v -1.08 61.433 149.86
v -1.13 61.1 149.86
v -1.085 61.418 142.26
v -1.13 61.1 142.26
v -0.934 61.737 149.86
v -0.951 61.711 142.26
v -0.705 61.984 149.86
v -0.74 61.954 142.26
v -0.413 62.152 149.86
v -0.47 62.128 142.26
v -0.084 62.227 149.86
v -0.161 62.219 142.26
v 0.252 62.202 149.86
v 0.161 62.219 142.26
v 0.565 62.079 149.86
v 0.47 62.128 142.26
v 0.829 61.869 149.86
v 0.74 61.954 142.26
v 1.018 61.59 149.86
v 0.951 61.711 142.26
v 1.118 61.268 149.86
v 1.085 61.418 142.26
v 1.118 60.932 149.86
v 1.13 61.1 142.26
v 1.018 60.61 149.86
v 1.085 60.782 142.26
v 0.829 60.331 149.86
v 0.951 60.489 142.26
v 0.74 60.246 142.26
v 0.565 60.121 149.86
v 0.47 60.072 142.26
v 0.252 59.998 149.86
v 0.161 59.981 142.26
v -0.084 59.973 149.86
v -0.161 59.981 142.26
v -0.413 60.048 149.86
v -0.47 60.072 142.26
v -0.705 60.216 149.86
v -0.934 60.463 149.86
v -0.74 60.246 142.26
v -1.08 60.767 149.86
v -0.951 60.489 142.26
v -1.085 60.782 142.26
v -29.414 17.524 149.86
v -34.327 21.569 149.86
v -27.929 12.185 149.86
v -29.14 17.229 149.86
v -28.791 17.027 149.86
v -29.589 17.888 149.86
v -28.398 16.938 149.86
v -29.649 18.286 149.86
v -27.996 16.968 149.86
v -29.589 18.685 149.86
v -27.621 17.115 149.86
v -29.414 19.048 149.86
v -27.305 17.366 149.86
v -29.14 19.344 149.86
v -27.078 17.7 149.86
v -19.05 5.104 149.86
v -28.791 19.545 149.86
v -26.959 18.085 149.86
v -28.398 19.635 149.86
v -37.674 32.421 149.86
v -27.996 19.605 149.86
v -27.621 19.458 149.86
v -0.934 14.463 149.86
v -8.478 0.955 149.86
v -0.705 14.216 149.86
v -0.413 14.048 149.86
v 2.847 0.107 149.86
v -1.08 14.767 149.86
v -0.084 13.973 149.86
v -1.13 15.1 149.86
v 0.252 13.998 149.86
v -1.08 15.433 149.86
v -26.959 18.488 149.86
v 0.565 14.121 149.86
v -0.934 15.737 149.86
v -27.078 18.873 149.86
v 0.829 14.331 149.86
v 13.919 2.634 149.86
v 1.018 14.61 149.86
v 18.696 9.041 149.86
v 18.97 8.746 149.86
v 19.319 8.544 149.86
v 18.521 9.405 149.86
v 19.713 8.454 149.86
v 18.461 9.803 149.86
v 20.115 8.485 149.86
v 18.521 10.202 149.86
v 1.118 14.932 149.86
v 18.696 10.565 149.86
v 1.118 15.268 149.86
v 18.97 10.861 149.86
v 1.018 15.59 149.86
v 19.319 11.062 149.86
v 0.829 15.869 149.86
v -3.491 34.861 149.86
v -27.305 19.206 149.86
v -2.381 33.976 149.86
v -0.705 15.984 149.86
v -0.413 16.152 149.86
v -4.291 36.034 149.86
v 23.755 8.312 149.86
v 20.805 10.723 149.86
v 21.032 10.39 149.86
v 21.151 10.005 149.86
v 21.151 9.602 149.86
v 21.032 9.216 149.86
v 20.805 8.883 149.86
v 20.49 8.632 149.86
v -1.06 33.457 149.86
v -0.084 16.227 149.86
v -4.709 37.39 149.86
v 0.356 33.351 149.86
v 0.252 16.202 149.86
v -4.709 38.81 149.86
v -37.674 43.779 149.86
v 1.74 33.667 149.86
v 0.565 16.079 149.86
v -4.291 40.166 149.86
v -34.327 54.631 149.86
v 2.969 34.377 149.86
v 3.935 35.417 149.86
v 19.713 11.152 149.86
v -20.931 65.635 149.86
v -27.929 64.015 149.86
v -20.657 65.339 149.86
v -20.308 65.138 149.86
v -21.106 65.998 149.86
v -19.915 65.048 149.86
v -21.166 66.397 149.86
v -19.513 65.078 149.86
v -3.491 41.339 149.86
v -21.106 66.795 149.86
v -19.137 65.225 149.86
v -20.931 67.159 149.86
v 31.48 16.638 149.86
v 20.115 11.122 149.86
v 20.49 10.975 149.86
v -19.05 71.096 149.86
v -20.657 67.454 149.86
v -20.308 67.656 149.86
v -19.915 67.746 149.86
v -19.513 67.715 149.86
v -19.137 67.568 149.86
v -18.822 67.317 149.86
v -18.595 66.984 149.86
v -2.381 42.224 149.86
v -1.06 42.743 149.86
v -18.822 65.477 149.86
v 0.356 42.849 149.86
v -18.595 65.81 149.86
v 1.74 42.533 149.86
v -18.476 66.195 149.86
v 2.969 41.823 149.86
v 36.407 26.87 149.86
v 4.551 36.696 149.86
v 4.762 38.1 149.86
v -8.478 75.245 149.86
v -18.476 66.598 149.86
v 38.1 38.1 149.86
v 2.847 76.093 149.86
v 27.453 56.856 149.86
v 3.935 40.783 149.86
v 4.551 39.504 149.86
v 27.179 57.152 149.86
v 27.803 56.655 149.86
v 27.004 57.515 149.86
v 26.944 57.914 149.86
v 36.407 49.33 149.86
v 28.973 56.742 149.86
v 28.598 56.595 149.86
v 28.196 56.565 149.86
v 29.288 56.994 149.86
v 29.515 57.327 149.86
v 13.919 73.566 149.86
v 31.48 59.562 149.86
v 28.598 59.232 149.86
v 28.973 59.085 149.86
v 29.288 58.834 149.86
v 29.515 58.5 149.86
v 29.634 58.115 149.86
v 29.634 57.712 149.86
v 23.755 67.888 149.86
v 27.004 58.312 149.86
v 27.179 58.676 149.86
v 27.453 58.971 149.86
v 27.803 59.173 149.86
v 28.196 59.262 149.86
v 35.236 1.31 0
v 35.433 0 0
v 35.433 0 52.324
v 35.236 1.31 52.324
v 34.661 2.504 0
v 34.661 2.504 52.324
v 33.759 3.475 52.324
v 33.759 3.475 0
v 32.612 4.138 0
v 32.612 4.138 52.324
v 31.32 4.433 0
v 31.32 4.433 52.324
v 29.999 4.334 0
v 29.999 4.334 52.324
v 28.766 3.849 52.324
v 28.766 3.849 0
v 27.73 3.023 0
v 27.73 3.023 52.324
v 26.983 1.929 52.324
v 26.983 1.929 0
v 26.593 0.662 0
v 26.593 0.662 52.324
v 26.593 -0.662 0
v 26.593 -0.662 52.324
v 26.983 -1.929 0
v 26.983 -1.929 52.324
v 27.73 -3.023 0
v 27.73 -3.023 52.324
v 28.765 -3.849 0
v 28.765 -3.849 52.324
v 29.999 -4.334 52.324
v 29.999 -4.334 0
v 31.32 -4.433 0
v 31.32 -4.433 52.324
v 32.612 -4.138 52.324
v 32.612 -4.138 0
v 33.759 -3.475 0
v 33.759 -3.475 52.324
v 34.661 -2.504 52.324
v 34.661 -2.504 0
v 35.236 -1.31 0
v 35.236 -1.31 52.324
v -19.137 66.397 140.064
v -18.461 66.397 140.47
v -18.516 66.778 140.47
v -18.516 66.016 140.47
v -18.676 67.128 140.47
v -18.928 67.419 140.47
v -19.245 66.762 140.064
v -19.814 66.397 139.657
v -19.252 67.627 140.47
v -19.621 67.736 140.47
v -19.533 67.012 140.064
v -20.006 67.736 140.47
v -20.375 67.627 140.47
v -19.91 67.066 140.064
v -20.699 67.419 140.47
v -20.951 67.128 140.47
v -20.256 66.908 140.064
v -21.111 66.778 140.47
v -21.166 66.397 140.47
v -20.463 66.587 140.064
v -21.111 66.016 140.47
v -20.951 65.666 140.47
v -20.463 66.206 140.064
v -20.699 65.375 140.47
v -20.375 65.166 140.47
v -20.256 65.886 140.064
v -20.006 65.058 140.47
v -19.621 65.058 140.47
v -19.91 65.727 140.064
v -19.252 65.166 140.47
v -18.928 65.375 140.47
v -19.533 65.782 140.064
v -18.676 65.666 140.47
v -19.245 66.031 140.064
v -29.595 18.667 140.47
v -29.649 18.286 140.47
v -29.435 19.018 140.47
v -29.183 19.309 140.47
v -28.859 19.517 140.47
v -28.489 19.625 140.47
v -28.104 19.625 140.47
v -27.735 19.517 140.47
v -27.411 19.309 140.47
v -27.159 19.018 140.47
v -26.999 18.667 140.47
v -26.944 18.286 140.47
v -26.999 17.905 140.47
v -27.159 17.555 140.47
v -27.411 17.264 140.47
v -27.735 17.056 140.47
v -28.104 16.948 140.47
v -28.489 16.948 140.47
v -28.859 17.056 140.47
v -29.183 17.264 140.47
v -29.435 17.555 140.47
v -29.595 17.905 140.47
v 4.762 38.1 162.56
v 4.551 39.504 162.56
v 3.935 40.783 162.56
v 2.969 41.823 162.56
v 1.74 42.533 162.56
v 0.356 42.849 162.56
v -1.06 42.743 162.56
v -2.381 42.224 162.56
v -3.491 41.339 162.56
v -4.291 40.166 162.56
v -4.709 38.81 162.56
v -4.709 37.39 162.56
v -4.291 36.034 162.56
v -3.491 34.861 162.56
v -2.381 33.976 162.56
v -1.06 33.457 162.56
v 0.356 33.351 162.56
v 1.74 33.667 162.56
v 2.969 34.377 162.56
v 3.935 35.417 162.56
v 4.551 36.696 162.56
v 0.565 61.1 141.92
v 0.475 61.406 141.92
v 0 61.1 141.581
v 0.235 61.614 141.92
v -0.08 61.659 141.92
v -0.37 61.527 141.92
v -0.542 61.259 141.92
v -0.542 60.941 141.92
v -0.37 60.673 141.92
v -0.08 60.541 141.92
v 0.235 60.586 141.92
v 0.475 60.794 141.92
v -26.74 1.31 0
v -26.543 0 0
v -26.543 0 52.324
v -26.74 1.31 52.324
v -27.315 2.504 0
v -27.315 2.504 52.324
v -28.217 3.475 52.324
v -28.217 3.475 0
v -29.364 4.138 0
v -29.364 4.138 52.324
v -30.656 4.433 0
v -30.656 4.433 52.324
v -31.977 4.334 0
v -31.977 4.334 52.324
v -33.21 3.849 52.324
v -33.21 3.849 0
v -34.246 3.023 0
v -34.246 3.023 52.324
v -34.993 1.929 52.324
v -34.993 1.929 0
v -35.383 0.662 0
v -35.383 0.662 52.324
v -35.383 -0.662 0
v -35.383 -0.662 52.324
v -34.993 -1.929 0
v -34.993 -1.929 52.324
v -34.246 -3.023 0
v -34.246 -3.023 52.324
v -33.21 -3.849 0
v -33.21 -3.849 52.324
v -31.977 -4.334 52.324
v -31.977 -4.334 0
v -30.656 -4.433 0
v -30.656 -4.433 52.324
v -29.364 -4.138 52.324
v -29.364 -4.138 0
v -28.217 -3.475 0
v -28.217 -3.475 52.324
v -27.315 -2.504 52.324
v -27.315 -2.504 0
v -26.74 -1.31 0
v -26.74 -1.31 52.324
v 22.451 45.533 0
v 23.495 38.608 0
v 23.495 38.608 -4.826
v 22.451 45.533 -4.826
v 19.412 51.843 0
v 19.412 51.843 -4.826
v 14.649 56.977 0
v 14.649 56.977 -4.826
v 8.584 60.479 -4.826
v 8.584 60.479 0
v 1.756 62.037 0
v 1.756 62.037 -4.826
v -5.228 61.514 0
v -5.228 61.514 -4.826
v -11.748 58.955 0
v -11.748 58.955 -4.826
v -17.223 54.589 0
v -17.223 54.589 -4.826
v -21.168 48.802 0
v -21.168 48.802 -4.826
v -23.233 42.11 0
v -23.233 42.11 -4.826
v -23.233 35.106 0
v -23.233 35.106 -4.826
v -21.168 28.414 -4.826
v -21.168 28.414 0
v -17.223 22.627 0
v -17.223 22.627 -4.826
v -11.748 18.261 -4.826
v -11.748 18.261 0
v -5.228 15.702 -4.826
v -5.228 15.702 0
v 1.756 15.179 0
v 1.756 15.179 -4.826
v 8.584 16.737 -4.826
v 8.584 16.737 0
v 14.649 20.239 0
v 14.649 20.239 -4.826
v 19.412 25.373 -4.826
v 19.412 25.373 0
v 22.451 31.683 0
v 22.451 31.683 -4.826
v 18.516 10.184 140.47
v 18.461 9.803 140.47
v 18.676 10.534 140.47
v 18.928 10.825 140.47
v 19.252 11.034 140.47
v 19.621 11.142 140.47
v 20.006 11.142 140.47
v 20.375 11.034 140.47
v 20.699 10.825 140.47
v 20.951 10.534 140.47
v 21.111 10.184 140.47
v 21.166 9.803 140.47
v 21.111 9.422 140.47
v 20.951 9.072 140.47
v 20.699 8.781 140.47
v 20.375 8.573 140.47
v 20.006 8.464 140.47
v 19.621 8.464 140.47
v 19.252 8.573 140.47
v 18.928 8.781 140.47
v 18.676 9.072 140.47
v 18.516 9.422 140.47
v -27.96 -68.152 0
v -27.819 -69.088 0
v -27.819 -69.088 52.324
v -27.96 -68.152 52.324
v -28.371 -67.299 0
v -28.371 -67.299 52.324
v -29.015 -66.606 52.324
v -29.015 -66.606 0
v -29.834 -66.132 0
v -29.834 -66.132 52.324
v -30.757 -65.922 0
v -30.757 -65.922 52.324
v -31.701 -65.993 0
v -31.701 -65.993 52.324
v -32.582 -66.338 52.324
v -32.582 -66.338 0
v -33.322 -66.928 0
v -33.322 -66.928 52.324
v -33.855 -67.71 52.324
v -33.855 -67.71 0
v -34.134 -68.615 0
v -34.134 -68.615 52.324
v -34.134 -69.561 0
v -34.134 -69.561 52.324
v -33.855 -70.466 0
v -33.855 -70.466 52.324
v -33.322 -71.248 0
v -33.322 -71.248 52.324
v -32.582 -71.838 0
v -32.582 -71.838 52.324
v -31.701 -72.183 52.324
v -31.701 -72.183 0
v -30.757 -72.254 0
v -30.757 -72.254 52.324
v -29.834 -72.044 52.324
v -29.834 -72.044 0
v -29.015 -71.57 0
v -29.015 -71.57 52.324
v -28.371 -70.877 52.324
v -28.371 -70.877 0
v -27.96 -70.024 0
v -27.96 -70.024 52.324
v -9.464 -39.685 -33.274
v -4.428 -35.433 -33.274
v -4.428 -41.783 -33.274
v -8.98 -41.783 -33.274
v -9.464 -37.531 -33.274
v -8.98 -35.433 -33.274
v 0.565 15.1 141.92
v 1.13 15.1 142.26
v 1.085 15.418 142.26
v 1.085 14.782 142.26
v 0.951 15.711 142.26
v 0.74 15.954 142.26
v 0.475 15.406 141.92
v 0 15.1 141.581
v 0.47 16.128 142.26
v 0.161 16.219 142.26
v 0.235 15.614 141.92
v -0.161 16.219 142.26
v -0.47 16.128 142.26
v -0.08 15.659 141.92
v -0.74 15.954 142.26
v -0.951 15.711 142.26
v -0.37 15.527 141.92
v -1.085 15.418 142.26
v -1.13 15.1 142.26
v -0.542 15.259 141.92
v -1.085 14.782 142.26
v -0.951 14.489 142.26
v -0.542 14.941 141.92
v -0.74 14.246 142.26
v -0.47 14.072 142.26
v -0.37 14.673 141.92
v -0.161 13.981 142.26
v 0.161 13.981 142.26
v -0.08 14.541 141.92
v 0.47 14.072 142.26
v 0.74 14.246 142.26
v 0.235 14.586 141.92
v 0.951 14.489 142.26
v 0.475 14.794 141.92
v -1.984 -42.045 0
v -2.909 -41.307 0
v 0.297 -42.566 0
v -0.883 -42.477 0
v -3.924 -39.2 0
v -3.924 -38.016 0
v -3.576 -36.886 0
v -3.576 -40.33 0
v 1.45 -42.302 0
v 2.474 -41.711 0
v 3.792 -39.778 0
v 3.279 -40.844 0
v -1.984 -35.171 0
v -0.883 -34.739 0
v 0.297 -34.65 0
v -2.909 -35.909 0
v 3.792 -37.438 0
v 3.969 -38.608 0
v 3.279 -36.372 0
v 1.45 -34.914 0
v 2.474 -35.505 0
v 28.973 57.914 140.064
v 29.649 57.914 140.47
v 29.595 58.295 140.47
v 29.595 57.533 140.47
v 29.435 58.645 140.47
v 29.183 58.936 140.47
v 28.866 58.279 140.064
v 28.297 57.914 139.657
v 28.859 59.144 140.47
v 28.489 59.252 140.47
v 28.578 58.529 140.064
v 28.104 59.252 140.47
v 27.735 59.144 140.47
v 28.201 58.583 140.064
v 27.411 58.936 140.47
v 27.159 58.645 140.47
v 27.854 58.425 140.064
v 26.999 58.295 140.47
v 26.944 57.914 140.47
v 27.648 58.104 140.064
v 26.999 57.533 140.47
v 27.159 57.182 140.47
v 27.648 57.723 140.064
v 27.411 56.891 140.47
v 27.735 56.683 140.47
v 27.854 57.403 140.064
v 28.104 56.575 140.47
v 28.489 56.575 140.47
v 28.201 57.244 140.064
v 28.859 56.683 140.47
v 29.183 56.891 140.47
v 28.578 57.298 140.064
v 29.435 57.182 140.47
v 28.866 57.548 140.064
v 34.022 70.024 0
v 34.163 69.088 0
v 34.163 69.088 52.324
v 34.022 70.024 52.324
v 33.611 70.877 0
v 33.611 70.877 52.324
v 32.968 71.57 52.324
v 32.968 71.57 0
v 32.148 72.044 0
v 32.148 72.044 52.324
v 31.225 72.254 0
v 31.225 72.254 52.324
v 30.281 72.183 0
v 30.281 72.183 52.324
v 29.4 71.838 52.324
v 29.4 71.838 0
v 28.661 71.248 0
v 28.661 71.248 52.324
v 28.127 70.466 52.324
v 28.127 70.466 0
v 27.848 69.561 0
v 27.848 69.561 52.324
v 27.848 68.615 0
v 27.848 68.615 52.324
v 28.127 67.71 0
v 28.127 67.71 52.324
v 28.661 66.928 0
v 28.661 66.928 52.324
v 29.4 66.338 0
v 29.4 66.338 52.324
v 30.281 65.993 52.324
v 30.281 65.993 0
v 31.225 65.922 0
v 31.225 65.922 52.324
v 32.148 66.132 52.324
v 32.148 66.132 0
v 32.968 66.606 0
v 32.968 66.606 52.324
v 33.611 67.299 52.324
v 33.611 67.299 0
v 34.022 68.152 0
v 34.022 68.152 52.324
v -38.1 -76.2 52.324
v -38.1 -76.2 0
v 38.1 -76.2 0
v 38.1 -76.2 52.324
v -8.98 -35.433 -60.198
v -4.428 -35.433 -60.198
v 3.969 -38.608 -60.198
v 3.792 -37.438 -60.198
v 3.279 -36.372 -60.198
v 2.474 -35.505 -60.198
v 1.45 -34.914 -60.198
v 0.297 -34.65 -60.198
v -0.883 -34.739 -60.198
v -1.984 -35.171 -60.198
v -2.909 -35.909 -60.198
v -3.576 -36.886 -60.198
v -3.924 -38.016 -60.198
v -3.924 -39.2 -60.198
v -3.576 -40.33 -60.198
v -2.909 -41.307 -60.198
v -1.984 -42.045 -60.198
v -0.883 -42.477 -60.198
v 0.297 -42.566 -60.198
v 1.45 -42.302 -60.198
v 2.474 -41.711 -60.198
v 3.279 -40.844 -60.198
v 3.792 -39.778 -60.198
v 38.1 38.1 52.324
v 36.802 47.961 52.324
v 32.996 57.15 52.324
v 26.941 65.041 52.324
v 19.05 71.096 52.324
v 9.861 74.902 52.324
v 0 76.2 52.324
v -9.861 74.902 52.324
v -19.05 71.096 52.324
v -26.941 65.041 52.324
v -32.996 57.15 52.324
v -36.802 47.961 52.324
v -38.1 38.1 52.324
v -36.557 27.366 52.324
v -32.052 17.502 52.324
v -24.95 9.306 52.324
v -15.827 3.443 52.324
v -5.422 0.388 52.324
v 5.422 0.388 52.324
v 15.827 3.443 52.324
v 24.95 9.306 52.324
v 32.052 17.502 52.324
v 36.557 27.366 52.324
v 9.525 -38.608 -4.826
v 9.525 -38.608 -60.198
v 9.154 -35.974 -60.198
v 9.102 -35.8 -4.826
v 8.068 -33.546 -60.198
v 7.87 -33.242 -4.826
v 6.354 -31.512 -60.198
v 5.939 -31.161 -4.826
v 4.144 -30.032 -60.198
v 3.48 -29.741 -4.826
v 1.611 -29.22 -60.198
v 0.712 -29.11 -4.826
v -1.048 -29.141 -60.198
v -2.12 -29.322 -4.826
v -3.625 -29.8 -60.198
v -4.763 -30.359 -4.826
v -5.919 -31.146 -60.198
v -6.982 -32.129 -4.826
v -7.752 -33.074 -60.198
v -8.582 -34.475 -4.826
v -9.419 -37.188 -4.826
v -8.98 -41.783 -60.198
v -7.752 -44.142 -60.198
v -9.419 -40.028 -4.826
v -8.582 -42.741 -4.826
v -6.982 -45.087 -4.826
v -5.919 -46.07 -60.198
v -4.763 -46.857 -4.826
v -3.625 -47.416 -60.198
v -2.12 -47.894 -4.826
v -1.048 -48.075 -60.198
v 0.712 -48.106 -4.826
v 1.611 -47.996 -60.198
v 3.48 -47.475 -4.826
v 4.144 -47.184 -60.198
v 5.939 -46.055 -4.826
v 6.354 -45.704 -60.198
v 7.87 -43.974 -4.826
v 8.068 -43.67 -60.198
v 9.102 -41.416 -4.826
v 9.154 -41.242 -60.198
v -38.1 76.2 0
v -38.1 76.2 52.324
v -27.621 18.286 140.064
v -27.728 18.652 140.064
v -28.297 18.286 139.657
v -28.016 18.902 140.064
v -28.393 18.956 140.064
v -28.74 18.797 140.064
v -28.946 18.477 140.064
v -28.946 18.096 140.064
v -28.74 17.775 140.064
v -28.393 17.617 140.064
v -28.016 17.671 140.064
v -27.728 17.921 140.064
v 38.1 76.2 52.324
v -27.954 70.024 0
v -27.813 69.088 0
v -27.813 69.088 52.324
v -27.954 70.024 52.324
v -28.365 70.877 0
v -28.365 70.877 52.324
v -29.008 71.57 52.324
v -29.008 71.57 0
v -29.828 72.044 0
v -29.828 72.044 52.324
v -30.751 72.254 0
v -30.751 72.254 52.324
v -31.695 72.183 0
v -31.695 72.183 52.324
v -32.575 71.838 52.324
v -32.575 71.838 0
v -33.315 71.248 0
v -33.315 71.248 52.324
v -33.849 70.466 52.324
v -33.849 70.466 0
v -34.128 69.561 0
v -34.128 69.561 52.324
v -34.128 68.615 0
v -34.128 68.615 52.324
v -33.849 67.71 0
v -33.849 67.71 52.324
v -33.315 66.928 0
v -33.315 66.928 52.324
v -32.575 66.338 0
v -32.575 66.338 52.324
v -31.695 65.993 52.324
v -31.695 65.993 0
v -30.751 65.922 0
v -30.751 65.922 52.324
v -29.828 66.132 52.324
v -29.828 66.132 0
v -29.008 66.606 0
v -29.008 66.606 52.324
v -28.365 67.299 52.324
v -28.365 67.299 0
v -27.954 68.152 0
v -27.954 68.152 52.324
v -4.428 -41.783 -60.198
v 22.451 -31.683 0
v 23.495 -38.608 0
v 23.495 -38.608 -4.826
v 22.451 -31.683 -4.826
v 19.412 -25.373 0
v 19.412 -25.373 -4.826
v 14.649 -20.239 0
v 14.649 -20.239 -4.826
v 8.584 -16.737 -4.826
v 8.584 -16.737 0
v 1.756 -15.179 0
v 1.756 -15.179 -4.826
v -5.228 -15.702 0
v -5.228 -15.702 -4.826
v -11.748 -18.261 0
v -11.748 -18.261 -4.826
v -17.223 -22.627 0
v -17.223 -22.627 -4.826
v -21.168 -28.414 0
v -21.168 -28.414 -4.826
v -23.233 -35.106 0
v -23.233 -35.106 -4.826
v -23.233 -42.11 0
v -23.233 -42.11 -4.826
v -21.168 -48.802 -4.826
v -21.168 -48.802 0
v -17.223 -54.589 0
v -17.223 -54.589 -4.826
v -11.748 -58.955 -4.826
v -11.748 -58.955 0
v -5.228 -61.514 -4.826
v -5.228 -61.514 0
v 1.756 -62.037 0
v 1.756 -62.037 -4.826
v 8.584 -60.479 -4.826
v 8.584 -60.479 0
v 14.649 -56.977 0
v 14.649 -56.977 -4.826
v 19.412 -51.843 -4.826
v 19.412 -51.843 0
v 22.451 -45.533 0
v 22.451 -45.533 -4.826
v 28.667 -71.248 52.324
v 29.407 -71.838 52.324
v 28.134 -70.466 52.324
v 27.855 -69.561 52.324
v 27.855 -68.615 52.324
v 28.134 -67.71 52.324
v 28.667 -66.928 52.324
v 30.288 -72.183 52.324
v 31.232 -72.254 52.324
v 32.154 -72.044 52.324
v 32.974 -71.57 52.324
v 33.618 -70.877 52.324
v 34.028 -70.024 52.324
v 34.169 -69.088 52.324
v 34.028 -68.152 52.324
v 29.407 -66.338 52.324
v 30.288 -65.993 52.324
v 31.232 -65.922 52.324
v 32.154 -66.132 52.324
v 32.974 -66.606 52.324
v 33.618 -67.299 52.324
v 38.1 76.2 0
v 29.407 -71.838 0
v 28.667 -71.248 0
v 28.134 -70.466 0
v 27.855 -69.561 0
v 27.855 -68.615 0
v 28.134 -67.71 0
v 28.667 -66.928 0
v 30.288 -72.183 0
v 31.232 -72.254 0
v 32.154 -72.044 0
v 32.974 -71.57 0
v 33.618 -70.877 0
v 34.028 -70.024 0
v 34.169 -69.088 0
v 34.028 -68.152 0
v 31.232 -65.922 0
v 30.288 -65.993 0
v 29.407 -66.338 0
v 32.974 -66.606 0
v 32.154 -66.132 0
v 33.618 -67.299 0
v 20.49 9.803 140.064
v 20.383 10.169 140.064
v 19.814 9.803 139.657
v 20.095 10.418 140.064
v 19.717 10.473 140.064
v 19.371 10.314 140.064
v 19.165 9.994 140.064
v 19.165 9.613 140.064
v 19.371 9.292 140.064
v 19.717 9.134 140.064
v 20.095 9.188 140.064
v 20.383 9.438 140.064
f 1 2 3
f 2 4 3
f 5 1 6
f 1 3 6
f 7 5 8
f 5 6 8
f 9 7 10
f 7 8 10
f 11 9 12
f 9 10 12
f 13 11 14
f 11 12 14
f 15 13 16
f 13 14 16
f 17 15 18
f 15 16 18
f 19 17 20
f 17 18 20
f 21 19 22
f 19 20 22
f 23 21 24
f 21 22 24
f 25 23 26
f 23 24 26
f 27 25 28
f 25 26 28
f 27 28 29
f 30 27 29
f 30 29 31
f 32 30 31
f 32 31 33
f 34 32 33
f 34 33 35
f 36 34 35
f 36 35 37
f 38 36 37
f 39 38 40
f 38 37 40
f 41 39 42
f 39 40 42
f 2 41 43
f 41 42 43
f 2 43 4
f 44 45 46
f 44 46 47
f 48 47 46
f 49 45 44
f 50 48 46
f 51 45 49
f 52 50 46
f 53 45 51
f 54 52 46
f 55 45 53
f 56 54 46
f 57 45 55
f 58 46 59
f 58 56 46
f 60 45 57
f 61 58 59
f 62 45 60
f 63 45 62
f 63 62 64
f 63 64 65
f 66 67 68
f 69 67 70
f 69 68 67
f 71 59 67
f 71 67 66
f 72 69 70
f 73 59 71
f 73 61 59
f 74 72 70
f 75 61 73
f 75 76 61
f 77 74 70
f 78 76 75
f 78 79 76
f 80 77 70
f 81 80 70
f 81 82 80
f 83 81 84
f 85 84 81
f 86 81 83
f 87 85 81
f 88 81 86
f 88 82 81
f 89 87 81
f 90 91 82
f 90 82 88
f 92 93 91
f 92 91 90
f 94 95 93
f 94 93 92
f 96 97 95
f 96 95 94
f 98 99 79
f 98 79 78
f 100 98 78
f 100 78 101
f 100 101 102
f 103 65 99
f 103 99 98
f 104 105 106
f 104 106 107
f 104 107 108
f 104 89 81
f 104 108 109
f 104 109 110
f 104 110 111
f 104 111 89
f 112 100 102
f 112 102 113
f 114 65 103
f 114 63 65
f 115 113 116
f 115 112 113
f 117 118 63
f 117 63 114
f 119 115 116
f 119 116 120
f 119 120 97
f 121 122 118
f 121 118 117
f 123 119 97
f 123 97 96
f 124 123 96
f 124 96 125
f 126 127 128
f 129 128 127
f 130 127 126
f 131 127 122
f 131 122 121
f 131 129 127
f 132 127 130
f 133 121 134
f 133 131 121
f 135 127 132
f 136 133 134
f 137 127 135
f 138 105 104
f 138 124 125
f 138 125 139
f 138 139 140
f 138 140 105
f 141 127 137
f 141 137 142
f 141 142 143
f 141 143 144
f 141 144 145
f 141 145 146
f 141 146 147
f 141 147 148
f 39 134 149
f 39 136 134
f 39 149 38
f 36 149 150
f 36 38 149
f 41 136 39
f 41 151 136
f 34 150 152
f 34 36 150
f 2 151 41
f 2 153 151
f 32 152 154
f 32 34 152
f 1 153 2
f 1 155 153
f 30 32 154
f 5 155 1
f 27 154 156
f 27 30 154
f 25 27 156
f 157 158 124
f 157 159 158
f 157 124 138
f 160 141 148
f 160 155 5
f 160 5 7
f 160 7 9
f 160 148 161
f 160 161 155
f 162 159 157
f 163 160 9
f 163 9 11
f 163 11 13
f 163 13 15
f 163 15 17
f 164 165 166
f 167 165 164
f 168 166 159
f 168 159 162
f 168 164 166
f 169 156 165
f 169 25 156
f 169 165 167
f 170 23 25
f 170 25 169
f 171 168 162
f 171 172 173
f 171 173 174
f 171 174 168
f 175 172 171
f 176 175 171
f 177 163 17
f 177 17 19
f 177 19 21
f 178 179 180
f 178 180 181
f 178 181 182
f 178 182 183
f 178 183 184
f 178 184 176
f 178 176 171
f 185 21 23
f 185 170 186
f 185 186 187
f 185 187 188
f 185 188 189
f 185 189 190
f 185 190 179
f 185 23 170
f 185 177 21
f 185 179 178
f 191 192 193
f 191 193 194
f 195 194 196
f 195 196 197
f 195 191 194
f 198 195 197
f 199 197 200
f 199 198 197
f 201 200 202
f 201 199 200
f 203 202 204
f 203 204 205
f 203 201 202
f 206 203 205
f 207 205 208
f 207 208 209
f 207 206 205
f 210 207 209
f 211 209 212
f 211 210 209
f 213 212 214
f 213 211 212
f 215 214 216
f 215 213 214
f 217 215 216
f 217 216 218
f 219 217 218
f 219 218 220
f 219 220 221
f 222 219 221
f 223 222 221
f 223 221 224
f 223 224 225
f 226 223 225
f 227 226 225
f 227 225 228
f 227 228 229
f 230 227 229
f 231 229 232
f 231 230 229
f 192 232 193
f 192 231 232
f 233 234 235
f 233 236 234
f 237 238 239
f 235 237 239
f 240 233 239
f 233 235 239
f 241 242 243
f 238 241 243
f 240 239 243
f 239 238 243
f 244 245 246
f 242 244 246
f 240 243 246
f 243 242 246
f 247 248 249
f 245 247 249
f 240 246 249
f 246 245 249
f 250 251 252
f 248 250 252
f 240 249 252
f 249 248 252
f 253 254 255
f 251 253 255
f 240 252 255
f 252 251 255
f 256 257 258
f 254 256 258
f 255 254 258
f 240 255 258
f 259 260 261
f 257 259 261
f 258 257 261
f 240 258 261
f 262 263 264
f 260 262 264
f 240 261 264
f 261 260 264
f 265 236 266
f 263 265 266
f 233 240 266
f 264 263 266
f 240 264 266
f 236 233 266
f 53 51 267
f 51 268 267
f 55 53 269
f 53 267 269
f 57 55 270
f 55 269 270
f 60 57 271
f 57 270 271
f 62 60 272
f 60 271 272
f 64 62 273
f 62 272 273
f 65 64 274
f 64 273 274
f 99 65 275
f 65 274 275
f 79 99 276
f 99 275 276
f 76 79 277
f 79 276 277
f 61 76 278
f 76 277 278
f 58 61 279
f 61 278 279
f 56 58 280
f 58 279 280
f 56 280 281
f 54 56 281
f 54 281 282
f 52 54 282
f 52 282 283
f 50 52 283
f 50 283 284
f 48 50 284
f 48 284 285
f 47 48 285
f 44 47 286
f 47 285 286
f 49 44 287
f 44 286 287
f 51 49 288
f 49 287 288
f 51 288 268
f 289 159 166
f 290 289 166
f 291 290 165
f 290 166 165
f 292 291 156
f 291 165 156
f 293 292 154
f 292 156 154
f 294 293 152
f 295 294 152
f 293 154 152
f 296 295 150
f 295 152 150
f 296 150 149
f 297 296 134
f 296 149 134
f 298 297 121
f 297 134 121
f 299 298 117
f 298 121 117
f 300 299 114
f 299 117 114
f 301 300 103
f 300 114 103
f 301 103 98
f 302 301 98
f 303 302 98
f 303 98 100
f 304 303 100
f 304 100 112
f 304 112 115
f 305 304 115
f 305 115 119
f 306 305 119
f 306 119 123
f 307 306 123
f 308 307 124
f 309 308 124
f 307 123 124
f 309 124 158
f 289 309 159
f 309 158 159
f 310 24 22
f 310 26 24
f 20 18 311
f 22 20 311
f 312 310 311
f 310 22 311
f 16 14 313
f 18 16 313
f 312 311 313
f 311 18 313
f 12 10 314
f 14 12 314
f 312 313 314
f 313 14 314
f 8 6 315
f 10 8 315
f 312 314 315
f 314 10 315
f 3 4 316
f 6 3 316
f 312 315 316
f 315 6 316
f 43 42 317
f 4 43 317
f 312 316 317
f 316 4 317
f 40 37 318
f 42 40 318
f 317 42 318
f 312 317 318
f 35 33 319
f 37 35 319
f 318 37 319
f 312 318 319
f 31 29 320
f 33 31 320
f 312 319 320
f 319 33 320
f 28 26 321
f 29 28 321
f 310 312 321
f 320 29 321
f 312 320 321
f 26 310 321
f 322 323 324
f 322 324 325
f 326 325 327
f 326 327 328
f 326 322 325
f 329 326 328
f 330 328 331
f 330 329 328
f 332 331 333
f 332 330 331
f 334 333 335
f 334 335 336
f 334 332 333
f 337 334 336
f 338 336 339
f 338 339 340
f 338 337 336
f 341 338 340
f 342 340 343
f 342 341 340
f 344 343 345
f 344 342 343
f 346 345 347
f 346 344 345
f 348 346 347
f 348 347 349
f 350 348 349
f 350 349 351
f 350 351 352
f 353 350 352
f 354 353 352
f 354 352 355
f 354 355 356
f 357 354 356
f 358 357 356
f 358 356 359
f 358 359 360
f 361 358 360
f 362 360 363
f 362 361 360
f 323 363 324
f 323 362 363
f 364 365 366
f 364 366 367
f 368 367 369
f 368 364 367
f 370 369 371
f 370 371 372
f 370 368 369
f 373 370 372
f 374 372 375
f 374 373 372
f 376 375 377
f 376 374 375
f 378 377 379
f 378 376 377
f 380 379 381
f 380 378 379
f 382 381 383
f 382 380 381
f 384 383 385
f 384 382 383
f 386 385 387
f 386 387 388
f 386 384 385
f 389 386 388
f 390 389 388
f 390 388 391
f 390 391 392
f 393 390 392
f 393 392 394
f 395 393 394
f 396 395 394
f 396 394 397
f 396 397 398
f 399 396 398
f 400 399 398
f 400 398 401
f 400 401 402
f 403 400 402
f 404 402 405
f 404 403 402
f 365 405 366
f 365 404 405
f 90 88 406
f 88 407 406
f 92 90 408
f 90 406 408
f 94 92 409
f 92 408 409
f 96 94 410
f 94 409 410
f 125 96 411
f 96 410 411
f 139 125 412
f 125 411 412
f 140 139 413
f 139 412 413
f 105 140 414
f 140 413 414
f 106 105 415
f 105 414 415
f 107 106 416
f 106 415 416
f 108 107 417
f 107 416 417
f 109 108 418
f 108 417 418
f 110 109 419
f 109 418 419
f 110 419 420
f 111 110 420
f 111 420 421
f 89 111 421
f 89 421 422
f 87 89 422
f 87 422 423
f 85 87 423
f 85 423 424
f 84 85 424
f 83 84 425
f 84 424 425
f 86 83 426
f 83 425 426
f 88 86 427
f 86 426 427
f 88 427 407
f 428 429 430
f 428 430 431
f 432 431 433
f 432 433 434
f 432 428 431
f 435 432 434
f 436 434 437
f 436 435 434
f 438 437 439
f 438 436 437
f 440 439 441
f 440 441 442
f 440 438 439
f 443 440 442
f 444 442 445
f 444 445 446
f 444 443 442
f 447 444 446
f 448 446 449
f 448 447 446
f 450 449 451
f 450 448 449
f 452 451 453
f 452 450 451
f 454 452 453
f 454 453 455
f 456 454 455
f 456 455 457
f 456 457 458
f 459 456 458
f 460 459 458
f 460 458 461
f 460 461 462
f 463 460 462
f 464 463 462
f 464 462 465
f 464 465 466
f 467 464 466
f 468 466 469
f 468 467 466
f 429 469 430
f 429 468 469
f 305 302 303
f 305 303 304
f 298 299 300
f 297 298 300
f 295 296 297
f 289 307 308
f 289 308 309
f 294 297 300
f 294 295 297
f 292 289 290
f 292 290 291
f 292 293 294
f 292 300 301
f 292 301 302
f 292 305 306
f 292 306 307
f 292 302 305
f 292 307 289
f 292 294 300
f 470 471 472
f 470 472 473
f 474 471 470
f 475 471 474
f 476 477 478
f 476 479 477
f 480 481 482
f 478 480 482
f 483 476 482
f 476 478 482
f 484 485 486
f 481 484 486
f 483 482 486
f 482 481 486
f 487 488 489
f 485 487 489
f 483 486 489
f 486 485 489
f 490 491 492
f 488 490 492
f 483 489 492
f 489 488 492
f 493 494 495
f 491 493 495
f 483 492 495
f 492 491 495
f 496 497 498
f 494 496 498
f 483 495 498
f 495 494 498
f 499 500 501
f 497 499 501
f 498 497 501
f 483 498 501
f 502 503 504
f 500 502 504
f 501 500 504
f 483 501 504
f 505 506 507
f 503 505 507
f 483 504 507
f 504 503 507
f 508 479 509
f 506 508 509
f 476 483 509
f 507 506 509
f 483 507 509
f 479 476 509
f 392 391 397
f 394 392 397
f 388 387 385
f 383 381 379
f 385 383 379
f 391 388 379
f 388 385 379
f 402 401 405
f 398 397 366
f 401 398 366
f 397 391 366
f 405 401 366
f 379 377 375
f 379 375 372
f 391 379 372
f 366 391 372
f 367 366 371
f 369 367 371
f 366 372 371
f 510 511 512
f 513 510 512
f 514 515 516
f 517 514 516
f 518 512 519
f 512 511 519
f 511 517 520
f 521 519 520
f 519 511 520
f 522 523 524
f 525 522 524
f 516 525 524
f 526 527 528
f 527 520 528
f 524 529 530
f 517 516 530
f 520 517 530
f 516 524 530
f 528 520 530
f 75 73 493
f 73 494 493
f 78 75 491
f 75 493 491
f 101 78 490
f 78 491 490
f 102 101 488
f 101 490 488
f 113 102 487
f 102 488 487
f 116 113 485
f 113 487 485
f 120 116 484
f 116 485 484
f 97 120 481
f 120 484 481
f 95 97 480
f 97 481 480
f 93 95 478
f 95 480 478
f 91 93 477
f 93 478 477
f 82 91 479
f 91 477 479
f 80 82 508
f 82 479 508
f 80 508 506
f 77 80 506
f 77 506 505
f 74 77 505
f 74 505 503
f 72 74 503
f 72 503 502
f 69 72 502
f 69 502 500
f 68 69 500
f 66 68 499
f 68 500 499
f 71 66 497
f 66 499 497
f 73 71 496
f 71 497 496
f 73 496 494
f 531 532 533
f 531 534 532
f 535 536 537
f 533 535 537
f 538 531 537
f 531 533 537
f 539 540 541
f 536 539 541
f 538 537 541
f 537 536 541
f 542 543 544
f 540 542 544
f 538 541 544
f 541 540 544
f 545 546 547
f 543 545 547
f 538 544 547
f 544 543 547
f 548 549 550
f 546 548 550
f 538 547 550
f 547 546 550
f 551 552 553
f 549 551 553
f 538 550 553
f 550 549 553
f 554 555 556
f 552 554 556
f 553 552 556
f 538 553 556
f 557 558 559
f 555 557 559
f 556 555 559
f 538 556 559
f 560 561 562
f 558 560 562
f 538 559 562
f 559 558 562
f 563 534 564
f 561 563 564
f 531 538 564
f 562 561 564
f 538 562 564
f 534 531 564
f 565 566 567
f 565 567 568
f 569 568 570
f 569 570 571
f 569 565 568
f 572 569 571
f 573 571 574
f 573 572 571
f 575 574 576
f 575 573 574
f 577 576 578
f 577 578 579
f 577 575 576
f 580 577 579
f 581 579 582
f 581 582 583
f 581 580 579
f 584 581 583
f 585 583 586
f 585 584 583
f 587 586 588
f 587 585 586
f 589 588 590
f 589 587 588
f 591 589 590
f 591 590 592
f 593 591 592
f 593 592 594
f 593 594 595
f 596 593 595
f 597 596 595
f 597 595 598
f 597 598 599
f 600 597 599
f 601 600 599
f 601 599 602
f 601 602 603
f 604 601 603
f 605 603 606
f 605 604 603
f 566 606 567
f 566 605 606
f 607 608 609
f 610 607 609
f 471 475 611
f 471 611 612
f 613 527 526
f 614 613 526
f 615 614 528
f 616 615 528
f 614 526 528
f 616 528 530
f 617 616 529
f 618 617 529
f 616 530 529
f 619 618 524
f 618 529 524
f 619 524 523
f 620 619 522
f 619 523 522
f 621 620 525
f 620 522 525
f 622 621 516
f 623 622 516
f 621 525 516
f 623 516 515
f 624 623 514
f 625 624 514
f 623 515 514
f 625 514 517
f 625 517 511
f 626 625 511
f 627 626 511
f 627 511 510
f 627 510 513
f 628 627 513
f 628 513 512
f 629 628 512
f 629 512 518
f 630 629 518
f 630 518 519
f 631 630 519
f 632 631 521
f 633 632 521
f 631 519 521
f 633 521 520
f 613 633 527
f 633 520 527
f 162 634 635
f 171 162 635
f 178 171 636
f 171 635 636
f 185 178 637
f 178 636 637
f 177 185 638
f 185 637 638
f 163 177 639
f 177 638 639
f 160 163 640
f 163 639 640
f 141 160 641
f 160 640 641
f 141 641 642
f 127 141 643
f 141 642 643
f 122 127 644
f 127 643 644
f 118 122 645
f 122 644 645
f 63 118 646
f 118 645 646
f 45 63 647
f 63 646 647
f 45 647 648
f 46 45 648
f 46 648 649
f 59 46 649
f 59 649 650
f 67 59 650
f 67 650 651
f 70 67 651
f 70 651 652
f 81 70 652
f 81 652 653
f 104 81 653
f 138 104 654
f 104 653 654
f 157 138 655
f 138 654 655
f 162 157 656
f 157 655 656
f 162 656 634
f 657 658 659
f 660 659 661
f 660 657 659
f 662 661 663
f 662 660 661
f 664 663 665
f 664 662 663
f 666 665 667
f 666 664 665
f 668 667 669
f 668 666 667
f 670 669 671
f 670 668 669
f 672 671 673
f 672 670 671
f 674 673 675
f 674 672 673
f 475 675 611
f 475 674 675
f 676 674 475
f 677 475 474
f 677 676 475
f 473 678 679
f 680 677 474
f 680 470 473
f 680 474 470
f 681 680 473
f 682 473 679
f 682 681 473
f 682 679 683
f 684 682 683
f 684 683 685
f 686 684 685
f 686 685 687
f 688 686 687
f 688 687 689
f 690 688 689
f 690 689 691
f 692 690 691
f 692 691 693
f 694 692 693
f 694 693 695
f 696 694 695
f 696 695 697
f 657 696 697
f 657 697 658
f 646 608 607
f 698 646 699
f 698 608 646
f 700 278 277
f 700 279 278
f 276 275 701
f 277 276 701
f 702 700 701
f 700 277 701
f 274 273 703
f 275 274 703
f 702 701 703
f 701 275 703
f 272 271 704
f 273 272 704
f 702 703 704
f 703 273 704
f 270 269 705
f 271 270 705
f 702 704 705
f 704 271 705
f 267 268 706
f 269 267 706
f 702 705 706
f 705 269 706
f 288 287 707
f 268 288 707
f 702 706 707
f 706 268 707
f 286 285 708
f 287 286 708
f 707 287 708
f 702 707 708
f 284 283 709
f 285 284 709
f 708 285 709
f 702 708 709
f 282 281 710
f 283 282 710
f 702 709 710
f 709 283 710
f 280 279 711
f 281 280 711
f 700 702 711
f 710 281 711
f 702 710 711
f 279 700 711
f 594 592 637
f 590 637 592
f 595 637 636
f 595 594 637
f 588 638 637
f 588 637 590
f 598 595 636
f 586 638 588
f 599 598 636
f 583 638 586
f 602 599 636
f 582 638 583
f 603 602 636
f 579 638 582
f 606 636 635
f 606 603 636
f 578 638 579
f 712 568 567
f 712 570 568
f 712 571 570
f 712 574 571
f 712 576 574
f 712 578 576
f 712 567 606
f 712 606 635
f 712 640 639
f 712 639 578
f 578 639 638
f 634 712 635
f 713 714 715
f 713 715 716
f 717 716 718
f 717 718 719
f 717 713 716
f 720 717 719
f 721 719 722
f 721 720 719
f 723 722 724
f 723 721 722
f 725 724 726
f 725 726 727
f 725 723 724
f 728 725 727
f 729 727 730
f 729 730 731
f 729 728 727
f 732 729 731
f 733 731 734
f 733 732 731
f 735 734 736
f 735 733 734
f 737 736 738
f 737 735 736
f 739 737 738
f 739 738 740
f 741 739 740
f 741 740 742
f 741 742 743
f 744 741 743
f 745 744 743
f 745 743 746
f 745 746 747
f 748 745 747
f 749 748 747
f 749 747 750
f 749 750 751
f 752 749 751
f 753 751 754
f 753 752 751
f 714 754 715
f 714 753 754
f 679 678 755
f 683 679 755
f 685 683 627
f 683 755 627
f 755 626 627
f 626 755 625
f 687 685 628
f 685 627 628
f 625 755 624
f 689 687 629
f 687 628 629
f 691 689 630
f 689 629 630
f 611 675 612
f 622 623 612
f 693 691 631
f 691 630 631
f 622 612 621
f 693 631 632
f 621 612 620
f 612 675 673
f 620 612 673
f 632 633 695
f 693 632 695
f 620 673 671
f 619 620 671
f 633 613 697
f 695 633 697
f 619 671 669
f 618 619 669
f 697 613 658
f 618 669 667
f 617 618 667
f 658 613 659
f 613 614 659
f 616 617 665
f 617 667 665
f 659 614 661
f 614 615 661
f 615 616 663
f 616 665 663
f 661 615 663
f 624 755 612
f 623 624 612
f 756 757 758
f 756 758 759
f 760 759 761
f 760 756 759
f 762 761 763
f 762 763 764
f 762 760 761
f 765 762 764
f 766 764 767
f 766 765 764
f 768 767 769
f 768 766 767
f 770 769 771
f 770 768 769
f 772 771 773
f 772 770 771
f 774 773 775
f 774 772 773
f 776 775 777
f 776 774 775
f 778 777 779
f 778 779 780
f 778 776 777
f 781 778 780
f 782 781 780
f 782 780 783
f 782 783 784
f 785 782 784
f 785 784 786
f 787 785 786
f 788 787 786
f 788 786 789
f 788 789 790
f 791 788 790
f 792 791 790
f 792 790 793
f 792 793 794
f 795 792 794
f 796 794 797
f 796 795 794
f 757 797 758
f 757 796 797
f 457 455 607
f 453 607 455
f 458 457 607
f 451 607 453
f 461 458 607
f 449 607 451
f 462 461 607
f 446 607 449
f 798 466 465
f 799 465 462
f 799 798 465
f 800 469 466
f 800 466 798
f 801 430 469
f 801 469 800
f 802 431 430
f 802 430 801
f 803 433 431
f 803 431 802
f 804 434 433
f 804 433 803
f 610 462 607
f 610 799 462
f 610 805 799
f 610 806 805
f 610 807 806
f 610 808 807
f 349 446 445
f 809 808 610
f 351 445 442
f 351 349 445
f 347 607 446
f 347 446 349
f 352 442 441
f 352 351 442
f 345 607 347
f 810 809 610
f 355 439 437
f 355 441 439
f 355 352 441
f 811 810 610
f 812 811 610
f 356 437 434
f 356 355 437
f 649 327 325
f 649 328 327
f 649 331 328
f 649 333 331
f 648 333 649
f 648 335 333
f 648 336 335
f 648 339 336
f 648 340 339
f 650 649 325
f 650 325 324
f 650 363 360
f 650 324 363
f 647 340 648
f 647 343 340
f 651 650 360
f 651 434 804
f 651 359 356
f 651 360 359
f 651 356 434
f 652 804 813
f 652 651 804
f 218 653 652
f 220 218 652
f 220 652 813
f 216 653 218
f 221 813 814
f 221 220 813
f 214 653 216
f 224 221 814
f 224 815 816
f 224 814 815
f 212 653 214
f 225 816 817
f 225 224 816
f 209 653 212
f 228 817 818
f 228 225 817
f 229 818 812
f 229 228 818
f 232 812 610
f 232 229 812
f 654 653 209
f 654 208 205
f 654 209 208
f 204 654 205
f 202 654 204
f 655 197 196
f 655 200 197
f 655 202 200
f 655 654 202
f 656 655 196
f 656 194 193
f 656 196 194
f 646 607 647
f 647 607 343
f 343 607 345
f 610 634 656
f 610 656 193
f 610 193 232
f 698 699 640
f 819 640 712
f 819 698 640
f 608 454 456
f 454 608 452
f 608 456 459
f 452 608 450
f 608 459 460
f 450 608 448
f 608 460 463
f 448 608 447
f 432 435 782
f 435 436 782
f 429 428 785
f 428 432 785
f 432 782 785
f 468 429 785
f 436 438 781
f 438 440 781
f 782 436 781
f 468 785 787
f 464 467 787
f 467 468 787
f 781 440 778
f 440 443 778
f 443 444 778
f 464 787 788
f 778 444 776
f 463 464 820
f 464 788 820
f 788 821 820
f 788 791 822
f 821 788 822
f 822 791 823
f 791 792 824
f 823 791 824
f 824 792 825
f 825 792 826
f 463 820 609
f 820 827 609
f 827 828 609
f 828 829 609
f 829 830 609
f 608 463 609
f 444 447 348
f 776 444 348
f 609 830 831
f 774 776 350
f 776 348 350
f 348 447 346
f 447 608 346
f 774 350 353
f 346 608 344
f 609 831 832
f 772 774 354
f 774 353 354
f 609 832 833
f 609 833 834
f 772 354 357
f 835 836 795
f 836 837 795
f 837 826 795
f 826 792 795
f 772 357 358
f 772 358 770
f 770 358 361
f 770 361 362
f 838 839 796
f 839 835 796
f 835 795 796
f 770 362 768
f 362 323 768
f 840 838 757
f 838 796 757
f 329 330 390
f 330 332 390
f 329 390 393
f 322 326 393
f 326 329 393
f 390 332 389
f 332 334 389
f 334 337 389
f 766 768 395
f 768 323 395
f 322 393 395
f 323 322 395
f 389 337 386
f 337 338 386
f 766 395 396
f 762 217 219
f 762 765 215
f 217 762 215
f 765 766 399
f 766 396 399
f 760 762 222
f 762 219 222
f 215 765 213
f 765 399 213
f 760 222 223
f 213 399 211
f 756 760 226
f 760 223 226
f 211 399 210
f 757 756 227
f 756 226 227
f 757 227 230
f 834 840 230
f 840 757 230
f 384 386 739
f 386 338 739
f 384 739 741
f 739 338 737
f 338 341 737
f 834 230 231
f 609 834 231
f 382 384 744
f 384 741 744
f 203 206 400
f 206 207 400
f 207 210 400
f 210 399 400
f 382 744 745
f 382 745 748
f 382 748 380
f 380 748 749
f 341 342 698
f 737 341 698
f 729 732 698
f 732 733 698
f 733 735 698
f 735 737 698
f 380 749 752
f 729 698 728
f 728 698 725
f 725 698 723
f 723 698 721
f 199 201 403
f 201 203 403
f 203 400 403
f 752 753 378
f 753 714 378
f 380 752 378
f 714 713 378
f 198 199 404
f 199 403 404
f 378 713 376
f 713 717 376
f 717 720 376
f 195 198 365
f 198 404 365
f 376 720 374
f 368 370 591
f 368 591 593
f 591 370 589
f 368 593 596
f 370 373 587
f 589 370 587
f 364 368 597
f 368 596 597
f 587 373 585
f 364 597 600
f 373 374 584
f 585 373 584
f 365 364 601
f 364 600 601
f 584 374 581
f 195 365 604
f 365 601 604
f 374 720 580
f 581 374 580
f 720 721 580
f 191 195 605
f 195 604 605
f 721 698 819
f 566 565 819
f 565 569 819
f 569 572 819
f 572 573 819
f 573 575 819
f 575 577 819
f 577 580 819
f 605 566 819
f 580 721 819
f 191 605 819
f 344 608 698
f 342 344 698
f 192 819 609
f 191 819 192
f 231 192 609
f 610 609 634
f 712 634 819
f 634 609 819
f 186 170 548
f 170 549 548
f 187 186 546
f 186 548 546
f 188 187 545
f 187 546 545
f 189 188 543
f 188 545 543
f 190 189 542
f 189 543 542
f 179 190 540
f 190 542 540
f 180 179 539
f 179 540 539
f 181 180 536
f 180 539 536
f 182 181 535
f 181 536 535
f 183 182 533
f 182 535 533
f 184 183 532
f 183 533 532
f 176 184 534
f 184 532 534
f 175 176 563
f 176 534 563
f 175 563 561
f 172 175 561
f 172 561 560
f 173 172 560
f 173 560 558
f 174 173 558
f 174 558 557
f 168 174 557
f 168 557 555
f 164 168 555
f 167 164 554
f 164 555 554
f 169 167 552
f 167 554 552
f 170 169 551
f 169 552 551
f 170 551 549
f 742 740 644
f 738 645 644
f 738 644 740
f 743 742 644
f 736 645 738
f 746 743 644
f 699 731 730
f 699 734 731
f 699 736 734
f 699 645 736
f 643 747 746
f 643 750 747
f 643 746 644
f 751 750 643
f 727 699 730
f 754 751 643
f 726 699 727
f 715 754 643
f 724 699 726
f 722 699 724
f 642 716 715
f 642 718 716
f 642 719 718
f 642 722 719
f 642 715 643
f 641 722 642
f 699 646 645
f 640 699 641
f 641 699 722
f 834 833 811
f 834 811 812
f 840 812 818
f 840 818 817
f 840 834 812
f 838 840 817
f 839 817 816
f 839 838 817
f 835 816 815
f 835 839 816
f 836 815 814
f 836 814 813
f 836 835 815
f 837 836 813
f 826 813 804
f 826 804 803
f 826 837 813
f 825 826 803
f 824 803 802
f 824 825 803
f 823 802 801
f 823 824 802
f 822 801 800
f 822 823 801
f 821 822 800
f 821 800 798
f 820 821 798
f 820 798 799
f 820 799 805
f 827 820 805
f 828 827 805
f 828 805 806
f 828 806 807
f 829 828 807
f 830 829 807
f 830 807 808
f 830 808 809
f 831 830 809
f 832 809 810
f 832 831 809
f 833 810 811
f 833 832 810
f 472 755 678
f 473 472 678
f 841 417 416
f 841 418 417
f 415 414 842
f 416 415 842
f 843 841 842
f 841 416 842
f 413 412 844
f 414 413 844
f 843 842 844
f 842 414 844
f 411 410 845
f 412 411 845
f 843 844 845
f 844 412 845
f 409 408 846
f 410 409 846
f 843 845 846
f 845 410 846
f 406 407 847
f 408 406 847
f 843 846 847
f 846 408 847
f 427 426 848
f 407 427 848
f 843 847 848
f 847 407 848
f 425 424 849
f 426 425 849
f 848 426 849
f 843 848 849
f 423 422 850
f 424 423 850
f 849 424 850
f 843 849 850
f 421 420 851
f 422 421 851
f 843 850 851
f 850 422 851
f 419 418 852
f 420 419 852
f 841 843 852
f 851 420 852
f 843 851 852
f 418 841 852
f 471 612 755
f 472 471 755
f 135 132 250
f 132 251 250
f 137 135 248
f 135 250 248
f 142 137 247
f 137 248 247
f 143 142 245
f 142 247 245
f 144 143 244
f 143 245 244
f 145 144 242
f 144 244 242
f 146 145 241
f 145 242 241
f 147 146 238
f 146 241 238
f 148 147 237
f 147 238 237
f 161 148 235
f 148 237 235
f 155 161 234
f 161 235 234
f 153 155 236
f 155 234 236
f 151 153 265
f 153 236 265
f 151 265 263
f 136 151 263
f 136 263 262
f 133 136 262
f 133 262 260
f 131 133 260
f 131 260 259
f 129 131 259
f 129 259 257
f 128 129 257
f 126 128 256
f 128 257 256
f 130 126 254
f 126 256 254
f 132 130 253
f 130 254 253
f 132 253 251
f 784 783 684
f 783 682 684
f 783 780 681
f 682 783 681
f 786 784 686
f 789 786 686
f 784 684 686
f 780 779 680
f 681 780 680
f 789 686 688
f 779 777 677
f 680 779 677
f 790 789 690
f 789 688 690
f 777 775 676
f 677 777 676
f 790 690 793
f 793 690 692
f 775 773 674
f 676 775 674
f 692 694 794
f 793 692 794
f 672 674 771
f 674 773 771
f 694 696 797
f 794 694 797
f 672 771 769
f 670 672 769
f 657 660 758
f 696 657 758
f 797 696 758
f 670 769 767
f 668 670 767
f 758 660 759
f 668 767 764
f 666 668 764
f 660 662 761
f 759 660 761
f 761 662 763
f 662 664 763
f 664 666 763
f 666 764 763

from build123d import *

# Parameters (mm, degrees)
SKETCH1_W                 = 76.2
SKETCH1_H                 = 152.4
SKETCH1_R                 = 3.175
SKETCH1_R_2               = 4.445
BOSS_EXTRUDE1_DEPTH       = 52.324
SKETCH1_3_R               = 23.495
SKETCH1_3_R_2             = 9.525
BOSS_EXTRUDE2_DEPTH       = 4.826
SKETCH1_5_R               = 9.525
SKETCH1_5_R_2             = 3.96875
BOSS_EXTRUDE3_DEPTH       = 60.198
CUT_EXTRUDE1_START        = -26.924
CUT_EXTRUDE1_DEPTH        = 26.924
SKETCH4_R                 = 38.1
BOSS_EXTRUDE4_DEPTH       = 97.536
SKETCH5_R                 = 4.7625
BOSS_EXTRUDE5_DEPTH       = 12.7
F_4_40_TAPPED_HOLE1_D     = 2.2606
F_4_40_TAPPED_HOLE1_DEPTH = 7.6
F_4_40_TAPPED_HOLE1_TIP   = 0.679152758
F_6_32_TAPPED_HOLE1_D     = 2.7051
F_6_32_TAPPED_HOLE1_DEPTH = 9.39
F_6_32_TAPPED_HOLE1_TIP   = 0.81269403


with BuildPart() as part:
    # Sketch1 → Boss-Extrude1 (new body)
    with BuildSketch(Plane.XY):
        Rectangle(SKETCH1_W, SKETCH1_H)
        with Locations((-30.994242086, -69.088)):
            Circle(SKETCH1_R, mode=Mode.SUBTRACT)
        with Locations((-30.988, 0)):
            Circle(SKETCH1_R_2, mode=Mode.SUBTRACT)
        with Locations((30.994242086, -69.088)):
            Circle(SKETCH1_R, mode=Mode.SUBTRACT)
        with Locations((30.988, 0)):
            Circle(SKETCH1_R_2, mode=Mode.SUBTRACT)
        with Locations((-30.988, 69.088)):
            Circle(SKETCH1_R, mode=Mode.SUBTRACT)
        with Locations((30.988, 69.088)):
            Circle(SKETCH1_R, mode=Mode.SUBTRACT)
    extrude(amount=BOSS_EXTRUDE1_DEPTH)

    # Sketch1<3> → Boss-Extrude2 (add)
    # profile 1 of 2: a face of its own
    with BuildSketch(Plane.XY):
        with Locations((0, 38.608)):
            Circle(SKETCH1_3_R)
    # profile 2 of 2: a face of its own
    with BuildSketch(Plane.XY):
        with Locations((0, -38.608)):
            Circle(SKETCH1_3_R)
        with Locations((0, -38.608)):
            Circle(SKETCH1_3_R_2, mode=Mode.SUBTRACT)
    extrude(amount=-BOSS_EXTRUDE2_DEPTH)

    # Sketch1<5> → Boss-Extrude3 (add)
    with BuildSketch(Plane.XY):
        with Locations((0, -38.608)):
            Circle(SKETCH1_5_R)
        with Locations((0, -38.608)):
            Circle(SKETCH1_5_R_2, mode=Mode.SUBTRACT)
    extrude(amount=-BOSS_EXTRUDE3_DEPTH)

    # Sketch2 → Cut-Extrude1 (cut)
    with BuildSketch(Plane(origin=(0, 0, -60.198), x_dir=(-1, 0, 0), z_dir=(0, 0, -1)).offset(CUT_EXTRUDE1_START)):
        with BuildLine():
            Line((8.980256121, -35.433), (4.427938354, -35.433))
            Line((4.427938354, -35.433), (4.427938354, -41.783))
            Line((4.427938354, -41.783), (8.980256121, -41.783))
            ThreePointArc((8.980256121, -41.783), (9.525, -38.608), (8.980256121, -35.433))
        make_face()
    extrude(amount=CUT_EXTRUDE1_DEPTH, mode=Mode.SUBTRACT)

    # Sketch4 → Boss-Extrude4 (add)
    with BuildSketch(Plane.XY.offset(52.324)):
        with Locations((0, 38.1)):
            Circle(SKETCH4_R)
    extrude(amount=BOSS_EXTRUDE4_DEPTH)

    # Sketch5 → Boss-Extrude5 (add)
    with BuildSketch(Plane.XY.offset(149.86)):
        with Locations((0, 38.1)):
            Circle(SKETCH5_R)
    extrude(amount=BOSS_EXTRUDE5_DEPTH)

    # #4-40 Tapped Hole1
    with Locations(Plane.XY.offset(149.86)):
        with Locations((0, 61.1), (0, 15.1)):
            Hole(F_4_40_TAPPED_HOLE1_D / 2, depth=F_4_40_TAPPED_HOLE1_DEPTH)
            with Locations((0, 0, -(F_4_40_TAPPED_HOLE1_DEPTH + F_4_40_TAPPED_HOLE1_TIP / 2))):  # 118° drill point
                Cone(0, F_4_40_TAPPED_HOLE1_D / 2, F_4_40_TAPPED_HOLE1_TIP, mode=Mode.SUBTRACT)

    # #6-32 Tapped Hole1
    with Locations(Plane.XY.offset(149.86)):
        with Locations((28.296788218, 57.913624417), (19.813624417, 9.803211782), (-28.296788218, 18.286375583), (-19.813624417, 66.396788218)):
            Hole(F_6_32_TAPPED_HOLE1_D / 2, depth=F_6_32_TAPPED_HOLE1_DEPTH)
            with Locations((0, 0, -(F_6_32_TAPPED_HOLE1_DEPTH + F_6_32_TAPPED_HOLE1_TIP / 2))):  # 118° drill point
                Cone(0, F_6_32_TAPPED_HOLE1_D / 2, F_6_32_TAPPED_HOLE1_TIP, mode=Mode.SUBTRACT)


solid = part.part
